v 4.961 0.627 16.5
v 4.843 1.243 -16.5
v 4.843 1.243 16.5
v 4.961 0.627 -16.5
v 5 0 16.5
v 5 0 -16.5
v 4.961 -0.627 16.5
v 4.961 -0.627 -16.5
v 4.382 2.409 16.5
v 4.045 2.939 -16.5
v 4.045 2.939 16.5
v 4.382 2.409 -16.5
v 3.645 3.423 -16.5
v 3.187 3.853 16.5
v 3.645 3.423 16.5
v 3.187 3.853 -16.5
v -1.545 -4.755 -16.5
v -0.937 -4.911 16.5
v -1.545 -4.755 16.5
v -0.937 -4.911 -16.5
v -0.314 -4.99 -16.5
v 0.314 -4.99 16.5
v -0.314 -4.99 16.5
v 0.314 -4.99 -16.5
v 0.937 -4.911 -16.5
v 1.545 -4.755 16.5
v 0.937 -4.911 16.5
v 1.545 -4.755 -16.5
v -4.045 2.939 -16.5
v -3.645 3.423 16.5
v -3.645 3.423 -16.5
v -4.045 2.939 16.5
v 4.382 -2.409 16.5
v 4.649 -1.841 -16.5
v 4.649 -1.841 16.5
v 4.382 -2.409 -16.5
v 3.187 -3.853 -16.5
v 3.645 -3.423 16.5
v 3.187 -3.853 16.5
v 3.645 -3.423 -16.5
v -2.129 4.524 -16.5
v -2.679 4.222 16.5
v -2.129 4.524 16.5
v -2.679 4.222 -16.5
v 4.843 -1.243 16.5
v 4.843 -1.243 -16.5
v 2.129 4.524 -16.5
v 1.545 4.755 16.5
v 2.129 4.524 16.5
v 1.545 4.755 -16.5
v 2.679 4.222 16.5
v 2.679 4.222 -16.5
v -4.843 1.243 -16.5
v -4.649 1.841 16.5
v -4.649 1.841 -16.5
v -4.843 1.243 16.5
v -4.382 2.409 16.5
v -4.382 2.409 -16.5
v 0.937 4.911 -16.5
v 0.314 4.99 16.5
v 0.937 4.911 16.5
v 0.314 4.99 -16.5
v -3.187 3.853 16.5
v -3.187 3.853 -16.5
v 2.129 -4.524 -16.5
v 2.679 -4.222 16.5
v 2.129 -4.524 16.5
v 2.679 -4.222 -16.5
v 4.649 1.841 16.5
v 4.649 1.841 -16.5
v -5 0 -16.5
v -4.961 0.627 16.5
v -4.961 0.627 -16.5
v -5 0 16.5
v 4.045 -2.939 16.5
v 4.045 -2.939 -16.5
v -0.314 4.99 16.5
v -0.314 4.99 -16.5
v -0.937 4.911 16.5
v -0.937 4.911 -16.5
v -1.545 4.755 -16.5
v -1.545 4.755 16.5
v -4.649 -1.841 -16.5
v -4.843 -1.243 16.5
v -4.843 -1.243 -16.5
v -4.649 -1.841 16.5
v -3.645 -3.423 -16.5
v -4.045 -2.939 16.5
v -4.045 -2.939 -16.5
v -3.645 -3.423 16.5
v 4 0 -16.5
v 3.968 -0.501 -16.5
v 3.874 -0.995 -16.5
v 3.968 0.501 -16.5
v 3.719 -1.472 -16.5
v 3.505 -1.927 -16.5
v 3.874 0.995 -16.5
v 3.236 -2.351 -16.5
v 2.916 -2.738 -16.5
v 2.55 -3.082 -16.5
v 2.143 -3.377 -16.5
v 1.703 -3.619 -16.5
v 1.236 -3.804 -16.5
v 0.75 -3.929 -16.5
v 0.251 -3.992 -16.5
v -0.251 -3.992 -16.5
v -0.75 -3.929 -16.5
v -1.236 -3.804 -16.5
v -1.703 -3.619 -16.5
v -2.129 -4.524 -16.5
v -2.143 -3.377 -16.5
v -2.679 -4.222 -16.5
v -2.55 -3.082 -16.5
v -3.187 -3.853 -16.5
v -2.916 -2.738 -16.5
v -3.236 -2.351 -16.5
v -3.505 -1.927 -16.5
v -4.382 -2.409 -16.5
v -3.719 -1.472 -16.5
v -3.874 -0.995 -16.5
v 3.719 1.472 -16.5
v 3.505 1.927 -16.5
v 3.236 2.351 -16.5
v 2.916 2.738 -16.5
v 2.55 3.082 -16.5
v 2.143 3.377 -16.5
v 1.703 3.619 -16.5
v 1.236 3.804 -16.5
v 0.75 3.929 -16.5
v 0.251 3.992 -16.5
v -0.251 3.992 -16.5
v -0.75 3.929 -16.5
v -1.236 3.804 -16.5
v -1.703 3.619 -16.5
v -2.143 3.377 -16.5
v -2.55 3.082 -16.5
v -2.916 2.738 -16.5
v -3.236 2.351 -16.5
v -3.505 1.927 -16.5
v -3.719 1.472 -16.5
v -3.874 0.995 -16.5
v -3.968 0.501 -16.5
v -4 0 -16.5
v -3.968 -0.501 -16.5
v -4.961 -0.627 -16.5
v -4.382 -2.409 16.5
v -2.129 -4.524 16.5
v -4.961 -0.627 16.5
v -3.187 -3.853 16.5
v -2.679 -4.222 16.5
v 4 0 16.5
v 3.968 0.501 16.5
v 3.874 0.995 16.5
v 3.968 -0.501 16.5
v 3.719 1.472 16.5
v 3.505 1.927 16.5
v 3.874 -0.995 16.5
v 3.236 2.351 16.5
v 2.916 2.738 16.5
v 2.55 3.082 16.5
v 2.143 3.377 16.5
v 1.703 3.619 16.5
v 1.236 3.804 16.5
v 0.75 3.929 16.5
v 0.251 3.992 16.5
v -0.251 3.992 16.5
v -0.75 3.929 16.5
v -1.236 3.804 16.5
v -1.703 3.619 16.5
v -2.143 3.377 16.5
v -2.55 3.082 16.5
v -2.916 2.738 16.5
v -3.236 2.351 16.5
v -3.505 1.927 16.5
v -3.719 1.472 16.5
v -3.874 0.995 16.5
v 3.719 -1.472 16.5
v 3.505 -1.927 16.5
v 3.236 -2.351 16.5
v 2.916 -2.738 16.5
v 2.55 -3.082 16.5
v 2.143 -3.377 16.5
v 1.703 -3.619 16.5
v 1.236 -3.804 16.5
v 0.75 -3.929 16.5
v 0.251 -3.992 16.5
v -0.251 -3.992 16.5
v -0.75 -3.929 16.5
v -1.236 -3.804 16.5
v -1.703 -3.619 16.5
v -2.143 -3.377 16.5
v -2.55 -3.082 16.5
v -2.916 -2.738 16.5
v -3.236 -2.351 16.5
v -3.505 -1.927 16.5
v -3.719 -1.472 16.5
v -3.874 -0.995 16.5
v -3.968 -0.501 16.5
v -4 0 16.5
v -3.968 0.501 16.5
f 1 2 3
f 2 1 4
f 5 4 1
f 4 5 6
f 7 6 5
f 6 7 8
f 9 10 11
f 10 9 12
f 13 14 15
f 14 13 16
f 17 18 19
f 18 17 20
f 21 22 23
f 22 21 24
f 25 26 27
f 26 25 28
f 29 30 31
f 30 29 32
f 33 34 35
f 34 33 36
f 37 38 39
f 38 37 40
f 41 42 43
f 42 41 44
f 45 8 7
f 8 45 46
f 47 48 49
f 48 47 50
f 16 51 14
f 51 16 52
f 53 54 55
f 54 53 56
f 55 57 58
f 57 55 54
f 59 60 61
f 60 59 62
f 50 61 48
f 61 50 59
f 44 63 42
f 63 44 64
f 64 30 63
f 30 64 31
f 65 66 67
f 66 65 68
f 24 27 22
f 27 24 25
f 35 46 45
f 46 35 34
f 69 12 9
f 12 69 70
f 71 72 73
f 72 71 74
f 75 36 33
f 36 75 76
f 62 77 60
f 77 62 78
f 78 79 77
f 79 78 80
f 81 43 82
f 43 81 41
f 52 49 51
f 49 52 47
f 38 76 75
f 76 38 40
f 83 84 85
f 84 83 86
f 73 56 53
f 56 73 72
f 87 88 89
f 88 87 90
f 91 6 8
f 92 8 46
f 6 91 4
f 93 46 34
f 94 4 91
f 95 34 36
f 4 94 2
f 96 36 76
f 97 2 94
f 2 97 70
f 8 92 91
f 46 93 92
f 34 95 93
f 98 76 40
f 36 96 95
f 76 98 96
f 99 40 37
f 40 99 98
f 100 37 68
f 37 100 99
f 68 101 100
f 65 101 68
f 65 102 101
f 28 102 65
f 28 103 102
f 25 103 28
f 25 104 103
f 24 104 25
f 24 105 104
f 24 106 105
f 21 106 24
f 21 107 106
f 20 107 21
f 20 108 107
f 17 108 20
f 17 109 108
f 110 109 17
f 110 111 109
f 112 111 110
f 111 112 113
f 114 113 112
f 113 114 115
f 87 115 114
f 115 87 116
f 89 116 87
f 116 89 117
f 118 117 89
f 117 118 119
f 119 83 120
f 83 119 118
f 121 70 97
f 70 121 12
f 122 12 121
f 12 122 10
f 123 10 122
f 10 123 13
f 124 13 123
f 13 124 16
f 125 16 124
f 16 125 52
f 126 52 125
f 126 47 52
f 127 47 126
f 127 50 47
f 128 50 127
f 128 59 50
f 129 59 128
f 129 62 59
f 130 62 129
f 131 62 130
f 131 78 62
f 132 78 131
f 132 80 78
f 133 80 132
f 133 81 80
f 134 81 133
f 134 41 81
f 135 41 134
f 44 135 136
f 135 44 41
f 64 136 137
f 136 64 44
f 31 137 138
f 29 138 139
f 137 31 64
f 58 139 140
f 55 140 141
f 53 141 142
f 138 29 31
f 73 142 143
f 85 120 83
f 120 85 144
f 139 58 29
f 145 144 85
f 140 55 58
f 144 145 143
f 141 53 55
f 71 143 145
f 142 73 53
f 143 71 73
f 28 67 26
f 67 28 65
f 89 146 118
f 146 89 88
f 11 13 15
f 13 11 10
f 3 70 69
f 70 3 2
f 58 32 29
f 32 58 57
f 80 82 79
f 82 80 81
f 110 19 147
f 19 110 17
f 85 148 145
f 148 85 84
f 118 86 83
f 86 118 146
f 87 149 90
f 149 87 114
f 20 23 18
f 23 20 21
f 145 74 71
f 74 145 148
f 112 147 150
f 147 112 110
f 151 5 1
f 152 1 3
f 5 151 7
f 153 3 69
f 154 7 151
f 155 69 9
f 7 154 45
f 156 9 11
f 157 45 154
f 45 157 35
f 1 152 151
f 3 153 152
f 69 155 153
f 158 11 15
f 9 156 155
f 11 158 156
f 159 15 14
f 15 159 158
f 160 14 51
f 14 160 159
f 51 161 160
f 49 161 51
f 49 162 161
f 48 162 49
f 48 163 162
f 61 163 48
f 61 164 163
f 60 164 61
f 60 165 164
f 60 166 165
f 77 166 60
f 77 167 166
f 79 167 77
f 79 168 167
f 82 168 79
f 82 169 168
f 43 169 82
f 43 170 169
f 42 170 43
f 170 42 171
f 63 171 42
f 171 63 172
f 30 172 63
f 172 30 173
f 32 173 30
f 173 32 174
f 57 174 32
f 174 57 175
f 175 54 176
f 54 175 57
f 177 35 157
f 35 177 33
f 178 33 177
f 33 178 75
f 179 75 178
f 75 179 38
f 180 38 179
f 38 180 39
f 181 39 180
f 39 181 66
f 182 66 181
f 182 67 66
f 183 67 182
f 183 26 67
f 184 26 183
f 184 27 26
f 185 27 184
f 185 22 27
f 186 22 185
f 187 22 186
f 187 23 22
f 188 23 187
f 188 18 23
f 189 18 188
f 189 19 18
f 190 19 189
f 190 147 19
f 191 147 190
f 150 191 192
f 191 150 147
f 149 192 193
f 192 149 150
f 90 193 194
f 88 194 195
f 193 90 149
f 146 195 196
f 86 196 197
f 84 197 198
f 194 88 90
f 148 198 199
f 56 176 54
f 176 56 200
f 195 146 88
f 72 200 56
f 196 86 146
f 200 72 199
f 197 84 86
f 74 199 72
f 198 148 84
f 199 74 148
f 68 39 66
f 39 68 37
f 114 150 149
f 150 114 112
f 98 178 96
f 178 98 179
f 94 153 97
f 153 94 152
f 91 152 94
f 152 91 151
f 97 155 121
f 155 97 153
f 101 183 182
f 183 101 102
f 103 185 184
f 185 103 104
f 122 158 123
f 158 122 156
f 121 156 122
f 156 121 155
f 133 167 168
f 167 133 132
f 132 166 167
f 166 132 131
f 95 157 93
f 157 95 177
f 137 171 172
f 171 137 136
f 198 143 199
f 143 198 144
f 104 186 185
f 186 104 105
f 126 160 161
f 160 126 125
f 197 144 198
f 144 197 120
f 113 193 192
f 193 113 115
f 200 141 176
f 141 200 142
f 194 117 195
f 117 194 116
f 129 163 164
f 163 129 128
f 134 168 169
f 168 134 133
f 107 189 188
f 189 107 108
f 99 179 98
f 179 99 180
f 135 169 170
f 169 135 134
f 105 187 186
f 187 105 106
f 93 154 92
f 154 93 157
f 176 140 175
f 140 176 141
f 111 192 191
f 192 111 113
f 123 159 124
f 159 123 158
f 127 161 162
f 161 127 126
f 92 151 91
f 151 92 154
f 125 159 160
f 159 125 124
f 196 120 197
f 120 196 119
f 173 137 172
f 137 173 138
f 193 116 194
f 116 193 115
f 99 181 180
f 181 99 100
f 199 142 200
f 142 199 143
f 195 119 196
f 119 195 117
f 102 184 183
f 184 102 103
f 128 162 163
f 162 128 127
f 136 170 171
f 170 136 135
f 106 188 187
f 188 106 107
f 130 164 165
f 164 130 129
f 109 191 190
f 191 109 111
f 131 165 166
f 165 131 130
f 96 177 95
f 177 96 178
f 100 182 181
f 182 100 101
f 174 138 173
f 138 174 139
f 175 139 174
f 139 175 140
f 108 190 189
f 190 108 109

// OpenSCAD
$fn = 50;


difference() {
	union() {
		translate(v = [0, 0, -16.5000000000]) {
			cylinder(h = 33, r = 5.0000000000);
		}
	}
	union() {
		translate(v = [0, 0, -100.0000000000]) {
			cylinder(h = 200, r = 4.0000000000);
		}
	}
}
